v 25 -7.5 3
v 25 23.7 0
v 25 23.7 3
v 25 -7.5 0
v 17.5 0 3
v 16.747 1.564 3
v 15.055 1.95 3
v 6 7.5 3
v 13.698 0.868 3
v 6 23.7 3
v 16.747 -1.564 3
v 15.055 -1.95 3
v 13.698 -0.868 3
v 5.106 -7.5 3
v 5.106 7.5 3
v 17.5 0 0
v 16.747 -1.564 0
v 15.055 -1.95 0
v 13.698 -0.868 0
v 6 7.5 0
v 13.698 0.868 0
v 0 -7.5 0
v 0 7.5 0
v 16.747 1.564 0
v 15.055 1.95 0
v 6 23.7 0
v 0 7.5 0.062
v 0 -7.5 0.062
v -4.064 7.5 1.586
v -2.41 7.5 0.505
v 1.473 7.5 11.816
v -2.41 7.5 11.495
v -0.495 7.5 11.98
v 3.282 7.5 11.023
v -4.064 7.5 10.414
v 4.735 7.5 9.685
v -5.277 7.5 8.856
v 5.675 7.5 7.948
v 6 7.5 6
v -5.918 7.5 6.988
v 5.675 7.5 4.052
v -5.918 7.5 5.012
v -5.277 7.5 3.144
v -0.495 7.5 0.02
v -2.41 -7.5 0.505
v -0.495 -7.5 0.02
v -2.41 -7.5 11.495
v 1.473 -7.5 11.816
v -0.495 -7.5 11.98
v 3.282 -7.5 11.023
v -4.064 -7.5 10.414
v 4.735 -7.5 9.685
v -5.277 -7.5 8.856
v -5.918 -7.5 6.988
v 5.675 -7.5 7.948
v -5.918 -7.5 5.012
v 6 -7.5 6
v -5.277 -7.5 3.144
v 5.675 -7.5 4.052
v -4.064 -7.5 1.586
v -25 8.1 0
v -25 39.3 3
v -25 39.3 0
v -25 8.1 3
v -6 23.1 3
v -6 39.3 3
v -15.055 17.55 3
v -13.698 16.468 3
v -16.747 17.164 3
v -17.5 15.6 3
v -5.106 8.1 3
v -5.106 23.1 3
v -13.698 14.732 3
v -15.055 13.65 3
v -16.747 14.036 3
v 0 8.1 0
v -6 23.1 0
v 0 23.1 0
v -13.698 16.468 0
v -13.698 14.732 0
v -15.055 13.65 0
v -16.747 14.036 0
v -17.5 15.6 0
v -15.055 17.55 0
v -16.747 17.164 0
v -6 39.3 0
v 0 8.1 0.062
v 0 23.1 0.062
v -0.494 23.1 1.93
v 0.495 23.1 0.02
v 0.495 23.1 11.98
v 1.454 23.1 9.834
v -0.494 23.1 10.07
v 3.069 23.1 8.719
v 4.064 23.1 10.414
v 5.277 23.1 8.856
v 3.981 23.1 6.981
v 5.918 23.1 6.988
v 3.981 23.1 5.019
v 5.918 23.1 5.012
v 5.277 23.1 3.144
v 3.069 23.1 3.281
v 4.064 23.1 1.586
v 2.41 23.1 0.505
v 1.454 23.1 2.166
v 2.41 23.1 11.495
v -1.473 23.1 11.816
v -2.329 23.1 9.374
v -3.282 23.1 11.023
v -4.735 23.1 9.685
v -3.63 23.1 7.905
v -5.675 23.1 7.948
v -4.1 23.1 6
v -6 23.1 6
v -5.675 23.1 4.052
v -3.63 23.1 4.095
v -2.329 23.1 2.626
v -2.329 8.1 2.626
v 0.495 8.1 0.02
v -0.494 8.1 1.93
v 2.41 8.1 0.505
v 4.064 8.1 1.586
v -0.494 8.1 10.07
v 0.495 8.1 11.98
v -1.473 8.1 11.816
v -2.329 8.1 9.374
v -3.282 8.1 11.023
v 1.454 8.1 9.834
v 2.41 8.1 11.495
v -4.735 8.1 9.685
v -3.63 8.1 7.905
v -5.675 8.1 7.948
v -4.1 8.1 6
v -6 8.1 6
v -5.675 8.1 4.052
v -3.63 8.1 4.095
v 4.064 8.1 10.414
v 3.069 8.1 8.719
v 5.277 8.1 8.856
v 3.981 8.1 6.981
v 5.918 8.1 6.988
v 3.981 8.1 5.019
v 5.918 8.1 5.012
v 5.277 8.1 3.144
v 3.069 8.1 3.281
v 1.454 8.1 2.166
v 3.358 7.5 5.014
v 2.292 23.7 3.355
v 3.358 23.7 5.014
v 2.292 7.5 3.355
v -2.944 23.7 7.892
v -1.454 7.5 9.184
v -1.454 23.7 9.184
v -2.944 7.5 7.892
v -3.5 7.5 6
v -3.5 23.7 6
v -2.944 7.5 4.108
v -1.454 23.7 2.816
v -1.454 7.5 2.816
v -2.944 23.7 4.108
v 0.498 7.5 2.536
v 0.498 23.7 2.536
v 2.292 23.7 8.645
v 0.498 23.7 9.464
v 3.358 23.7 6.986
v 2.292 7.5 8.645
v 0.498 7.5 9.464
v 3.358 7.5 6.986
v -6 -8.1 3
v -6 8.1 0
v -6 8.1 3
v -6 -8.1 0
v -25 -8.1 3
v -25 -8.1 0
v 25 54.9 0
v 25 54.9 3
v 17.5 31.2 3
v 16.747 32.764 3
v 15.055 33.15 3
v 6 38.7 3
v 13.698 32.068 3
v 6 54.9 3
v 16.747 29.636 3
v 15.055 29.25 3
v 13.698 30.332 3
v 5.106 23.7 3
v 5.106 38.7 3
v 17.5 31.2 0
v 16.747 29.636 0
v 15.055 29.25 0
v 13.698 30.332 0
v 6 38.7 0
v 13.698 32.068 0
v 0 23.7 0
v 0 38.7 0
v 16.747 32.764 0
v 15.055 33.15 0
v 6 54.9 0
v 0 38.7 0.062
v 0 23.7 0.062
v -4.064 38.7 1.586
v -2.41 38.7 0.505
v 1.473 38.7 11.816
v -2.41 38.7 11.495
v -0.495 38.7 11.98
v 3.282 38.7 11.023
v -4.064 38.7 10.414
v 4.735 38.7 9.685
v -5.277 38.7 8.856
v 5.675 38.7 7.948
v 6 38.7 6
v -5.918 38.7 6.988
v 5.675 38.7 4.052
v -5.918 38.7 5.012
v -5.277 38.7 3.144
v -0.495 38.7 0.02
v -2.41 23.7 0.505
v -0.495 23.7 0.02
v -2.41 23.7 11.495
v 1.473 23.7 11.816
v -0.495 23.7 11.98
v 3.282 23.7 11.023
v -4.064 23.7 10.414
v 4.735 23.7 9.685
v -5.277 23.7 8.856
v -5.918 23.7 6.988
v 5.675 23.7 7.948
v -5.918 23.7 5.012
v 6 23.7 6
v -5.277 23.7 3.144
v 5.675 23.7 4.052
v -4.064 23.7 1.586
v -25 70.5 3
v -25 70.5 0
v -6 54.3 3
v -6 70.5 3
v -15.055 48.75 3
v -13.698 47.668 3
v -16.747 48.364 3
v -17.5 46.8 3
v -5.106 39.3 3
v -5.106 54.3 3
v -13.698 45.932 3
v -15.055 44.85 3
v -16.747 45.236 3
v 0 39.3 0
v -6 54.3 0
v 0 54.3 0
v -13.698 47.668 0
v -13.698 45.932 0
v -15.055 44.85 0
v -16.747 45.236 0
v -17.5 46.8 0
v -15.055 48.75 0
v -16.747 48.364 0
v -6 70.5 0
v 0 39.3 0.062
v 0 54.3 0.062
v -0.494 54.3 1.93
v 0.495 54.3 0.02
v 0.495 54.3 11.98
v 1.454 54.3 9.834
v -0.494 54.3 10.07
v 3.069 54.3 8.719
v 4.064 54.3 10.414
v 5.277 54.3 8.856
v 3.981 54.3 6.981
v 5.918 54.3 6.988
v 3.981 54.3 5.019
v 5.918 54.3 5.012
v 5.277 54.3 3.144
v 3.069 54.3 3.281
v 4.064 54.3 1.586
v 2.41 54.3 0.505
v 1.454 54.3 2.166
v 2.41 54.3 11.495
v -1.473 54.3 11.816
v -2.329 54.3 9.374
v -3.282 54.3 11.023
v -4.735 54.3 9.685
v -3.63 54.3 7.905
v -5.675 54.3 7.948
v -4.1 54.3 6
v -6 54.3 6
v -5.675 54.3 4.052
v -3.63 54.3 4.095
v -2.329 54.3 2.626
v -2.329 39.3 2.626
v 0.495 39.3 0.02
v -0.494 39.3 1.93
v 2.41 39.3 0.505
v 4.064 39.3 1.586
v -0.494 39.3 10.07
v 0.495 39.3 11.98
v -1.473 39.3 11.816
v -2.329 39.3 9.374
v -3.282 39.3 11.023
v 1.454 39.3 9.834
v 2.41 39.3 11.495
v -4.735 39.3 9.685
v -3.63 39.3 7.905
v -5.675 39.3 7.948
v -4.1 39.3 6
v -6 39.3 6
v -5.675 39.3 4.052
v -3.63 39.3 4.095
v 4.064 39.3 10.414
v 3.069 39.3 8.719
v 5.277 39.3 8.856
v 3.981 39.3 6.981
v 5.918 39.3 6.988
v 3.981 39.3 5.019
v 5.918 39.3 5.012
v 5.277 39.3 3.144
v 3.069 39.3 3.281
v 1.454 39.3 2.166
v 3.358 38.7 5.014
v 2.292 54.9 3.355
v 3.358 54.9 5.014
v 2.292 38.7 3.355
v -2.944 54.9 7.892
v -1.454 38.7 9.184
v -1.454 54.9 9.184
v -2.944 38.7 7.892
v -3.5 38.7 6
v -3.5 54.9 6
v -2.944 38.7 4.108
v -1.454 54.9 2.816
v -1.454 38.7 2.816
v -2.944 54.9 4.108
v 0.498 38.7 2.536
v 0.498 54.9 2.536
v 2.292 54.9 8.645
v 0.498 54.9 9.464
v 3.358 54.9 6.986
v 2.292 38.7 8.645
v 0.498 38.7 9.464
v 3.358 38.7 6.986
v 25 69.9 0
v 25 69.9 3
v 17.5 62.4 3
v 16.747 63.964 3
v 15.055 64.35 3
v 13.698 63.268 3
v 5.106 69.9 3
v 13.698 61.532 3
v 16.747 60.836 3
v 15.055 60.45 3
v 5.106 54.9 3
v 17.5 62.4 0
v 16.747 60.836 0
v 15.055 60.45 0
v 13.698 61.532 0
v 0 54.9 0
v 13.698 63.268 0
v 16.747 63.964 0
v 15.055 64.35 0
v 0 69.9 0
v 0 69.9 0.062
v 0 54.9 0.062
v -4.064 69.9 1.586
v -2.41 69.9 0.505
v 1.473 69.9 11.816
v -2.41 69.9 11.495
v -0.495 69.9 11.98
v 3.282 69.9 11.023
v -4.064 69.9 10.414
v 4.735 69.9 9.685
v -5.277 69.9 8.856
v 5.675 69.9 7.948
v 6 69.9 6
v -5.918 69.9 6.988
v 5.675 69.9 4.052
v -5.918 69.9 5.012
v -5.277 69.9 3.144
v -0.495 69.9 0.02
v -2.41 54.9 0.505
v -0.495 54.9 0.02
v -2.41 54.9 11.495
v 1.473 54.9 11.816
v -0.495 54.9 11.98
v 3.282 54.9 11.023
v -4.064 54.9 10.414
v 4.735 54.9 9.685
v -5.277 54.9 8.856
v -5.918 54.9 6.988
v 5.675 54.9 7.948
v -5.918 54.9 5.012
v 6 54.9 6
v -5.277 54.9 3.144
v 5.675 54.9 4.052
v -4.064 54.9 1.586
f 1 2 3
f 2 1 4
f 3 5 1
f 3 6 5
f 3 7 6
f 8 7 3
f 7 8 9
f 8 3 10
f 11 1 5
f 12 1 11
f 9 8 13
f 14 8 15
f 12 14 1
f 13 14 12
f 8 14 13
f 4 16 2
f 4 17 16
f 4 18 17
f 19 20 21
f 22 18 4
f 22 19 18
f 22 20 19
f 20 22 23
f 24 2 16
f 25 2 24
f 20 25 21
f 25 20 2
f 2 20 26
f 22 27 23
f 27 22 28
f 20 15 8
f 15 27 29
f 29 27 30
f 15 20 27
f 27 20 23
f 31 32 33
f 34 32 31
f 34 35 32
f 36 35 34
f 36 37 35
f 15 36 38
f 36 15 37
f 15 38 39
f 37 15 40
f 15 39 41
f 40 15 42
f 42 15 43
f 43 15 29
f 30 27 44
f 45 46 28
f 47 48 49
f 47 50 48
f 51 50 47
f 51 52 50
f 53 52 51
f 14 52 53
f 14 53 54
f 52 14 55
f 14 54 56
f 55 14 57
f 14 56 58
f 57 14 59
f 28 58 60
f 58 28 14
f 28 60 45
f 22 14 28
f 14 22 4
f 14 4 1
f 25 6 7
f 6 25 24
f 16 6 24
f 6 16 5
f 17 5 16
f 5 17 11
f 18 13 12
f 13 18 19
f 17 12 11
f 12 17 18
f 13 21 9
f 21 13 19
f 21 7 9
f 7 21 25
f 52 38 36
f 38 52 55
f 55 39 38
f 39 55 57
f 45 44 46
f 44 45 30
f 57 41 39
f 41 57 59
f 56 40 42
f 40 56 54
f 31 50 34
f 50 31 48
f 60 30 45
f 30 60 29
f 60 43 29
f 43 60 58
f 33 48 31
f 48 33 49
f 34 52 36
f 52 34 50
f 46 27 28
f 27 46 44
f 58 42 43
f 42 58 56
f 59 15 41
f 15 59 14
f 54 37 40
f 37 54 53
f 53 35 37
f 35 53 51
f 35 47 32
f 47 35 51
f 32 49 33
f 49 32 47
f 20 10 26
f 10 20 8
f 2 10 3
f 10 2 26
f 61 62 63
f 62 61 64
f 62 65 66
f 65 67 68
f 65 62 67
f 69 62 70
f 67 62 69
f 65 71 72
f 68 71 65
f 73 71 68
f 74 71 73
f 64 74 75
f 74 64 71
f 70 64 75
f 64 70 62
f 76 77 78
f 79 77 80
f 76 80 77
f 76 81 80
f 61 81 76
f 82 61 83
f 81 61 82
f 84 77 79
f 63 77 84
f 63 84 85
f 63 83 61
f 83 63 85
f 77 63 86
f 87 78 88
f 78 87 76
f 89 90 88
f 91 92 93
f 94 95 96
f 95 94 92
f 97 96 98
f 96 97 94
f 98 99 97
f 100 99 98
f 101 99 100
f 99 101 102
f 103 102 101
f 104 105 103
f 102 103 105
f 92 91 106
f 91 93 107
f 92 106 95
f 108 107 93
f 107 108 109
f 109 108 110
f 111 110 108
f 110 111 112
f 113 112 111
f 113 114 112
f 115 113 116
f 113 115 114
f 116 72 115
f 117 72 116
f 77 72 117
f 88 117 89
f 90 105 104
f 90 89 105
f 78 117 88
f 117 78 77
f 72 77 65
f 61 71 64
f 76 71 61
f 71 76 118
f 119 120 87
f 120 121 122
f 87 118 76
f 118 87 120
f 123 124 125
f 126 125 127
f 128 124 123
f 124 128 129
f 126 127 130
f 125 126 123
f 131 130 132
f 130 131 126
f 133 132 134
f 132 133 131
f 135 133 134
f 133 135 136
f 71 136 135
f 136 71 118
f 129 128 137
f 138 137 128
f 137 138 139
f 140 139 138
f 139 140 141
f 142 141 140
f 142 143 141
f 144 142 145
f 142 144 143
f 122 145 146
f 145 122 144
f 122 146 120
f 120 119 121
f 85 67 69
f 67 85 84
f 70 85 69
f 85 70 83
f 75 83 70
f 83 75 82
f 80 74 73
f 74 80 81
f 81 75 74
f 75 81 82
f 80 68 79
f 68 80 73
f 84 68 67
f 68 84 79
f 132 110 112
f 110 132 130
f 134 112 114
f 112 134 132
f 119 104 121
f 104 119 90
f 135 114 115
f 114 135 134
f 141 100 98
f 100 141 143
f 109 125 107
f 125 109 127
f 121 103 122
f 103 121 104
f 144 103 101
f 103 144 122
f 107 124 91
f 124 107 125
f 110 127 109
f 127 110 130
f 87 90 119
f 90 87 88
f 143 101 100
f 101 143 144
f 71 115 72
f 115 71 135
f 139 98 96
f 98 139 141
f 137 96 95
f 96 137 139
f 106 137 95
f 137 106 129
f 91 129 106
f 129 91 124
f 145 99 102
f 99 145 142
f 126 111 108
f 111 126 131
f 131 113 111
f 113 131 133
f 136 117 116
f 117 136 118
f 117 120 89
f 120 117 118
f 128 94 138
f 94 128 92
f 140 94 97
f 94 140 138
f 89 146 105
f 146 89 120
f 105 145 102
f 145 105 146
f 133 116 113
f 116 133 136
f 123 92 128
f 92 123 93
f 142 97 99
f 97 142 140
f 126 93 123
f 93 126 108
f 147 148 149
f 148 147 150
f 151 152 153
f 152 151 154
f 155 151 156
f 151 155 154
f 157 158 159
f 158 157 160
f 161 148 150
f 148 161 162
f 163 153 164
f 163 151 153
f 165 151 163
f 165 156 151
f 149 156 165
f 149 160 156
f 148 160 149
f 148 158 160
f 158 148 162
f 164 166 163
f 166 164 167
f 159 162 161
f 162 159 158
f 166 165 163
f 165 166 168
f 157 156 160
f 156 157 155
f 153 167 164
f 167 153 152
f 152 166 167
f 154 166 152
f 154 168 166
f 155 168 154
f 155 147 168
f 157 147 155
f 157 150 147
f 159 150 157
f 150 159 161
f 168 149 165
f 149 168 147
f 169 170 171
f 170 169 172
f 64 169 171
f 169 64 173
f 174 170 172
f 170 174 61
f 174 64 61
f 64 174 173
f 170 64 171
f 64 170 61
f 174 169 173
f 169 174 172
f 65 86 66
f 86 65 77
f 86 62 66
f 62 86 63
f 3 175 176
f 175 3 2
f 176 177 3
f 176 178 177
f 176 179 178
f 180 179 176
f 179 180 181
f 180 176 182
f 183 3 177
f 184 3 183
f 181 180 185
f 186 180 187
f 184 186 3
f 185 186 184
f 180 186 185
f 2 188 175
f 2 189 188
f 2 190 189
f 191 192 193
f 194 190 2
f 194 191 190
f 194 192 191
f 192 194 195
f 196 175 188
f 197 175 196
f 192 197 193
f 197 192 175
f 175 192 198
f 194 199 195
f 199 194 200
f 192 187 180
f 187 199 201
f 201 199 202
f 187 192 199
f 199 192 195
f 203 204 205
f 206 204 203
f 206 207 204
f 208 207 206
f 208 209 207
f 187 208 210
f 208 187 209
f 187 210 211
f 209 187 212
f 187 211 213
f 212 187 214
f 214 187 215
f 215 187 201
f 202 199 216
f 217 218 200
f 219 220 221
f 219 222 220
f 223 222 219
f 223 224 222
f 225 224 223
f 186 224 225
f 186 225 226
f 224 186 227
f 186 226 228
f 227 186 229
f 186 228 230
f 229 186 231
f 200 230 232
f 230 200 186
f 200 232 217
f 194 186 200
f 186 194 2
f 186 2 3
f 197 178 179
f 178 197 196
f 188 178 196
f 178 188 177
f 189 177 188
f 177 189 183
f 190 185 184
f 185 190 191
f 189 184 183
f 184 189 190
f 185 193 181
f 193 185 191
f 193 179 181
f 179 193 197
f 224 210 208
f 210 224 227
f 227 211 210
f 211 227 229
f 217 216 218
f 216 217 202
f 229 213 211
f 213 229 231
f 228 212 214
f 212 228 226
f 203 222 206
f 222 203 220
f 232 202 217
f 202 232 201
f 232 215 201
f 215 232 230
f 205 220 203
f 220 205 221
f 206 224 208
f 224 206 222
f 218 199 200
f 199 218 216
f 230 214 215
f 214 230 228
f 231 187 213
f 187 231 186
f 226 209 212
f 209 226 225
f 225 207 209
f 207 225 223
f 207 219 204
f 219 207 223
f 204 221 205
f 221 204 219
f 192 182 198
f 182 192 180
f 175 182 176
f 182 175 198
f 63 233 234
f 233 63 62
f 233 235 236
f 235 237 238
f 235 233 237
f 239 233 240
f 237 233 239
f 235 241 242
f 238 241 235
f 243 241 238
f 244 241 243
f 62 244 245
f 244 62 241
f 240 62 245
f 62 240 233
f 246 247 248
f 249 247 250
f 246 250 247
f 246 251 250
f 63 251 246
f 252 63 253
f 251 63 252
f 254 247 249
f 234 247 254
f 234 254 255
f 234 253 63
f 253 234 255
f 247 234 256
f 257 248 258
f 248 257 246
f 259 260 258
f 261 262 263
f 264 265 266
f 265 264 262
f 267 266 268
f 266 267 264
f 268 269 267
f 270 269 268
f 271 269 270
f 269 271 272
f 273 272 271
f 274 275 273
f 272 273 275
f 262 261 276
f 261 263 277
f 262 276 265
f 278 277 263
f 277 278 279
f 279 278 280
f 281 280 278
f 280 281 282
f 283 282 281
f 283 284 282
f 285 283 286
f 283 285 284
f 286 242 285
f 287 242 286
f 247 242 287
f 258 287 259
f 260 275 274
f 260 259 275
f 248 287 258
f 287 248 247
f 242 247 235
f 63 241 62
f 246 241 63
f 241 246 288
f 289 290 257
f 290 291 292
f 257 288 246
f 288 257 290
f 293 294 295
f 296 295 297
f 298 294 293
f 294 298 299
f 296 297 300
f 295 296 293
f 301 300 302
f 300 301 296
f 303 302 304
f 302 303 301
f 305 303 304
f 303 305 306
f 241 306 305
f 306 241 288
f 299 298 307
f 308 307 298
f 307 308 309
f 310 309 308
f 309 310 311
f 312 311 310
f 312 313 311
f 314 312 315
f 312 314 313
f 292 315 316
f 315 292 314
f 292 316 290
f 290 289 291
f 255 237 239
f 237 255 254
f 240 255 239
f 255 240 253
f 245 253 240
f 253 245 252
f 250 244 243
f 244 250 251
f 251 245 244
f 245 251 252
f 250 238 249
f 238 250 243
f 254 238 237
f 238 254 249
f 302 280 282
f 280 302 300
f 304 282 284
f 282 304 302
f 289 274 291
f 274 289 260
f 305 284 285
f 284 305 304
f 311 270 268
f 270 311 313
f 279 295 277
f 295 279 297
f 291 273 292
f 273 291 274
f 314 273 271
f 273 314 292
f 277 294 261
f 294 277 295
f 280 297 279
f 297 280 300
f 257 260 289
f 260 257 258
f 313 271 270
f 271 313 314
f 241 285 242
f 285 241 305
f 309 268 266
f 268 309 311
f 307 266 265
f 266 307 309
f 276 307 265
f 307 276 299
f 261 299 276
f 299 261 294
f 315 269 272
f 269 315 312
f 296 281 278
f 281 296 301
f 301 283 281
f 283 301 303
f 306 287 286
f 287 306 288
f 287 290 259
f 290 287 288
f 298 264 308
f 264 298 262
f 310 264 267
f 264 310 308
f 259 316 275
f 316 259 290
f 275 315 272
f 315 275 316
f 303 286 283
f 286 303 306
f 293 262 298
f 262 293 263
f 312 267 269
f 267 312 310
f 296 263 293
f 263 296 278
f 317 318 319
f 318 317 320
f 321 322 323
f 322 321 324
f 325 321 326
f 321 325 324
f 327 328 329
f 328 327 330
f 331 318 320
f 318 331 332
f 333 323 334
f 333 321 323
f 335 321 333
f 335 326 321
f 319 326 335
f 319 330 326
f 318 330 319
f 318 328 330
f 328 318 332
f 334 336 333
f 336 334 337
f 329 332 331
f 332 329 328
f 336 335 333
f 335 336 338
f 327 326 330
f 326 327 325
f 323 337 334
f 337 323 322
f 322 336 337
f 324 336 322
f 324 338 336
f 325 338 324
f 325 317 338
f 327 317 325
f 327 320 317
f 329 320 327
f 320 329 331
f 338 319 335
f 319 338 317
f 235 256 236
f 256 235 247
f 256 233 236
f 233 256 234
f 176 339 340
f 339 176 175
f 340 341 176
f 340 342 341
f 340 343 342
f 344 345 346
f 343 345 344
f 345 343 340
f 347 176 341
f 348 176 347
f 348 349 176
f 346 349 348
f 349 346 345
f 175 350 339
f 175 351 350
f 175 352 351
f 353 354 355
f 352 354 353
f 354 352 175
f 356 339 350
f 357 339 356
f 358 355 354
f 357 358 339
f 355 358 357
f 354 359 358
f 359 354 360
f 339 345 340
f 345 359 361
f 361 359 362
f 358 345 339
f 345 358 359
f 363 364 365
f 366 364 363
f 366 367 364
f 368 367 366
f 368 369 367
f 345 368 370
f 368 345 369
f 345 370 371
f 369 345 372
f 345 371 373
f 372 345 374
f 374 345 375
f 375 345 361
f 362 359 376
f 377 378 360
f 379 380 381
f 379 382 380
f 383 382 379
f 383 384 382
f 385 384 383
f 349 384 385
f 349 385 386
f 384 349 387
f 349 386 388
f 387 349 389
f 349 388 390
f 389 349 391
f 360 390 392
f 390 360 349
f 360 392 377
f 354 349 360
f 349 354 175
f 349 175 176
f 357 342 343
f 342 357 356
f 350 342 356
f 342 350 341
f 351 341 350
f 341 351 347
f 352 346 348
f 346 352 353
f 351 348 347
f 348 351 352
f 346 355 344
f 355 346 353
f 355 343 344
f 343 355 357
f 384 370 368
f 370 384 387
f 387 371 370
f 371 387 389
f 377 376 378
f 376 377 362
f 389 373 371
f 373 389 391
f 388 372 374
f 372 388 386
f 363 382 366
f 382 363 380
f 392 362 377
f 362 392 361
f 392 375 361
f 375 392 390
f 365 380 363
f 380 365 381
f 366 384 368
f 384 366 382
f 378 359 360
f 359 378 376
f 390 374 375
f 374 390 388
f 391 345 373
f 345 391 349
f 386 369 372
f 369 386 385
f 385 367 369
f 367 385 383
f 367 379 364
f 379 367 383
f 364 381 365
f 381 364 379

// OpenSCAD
/*[Link]*/
LinkRadius = 6;
//This is the length of each link, consider that this is the distance that your printer needs to be able to bridge.
LinkLength = 15;
//The thicker, the sturdier the overall hinge. Obiously InnerShaft + Inner Tolerance should never be bigger than Link Radius.
InnerShaft = 3.5;
//Depends on your printer/material, .6 worked well for me (this is the distance between the inner shaft and the inner layers of the links)
InnerTolerance = .6;
//Spacing between the links, i found .6mm to give good results
Spacing = .6;
//LinkNumber * LinkLength = the total length of your hinge.
LinkNumber = 5;
/*[Tabs]*/
TabLength0 = 25;
TabLength = 25;
TabThickness = 3;
HoleDiameter=4;
HoleOffset0=0;
HoleOffset=0;
//Do you want 2 long tabs or multiple smaller ones? 0=Yes, 1=No
LongTab = 0;

TotalLength = (LinkNumber*LinkLength)+(Spacing*(LinkNumber-1));


module solidHinge(LinkRadius,LinkLength,TabLength,TabThickness){
    union(){
        rotate([90,0,0]) linear_extrude(height=LinkLength,center=true) translate([0,LinkRadius,0]) circle(LinkRadius);
        translate([TabLength/2,0,TabThickness/2]) 
        difference(){cube([TabLength,LinkLength,TabThickness],center=true);
            translate([LinkRadius/2+HoleOffset,0,0])cylinder(h=TabThickness,r=HoleDiameter/2,center=true);
        }
    }
}


module hollowHinge(LinkRadius,LinkLength,TabLength,TabThickness,Spacing,InnerTolerance,InnerShaft){
    union(){
        difference(){
            union(){
                rotate([90,0,0]) linear_extrude(height=LinkLength,center=true) translate([0,LinkRadius,0]) circle(LinkRadius);
                translate([TabLength0/2,0,TabThickness/2]) 
                difference(){cube([TabLength0,LinkLength,TabThickness],center=true);
                translate([LinkRadius/2+HoleOffset0,0,0])cylinder(h=TabThickness,r=HoleDiameter/2,center=true);
                }
            }
            rotate([90,0,0]) linear_extrude(height=LinkLength+Spacing,center=true) translate([0,LinkRadius,0]) circle(InnerShaft+InnerTolerance,center=true);
        }
        rotate([90,0,0]) linear_extrude(height=LinkLength+(Spacing*2),center=true) translate([0,LinkRadius,0]) circle(InnerShaft,center=true);
    }
}

module CompleteHinge(LinkRadius,LinkLength,TabLength,TabThickness,Spacing,InnerTolerance,InnerShaft,LongTab,LinkNumber){
    
    union(){
        for(a=[0:LinkNumber-1]){
            if(a%2!=0){
                union(){
                mirror(1,0,0) translate([0,(LinkLength+(Spacing))*a,0]) hollowHinge(LinkRadius,LinkLength,TabLength,TabThickness,Spacing,InnerTolerance,InnerShaft); 
                   if(LongTab==0 && a!=LinkNumber-1){
                       if(a==1){
                       translate([-TabLength0/2-LinkRadius/2,0,TabThickness/2]) cube([TabLength0-LinkRadius,LinkLength+(Spacing*2),TabThickness],center=true);
                       }
                    translate([-TabLength0/2-LinkRadius/2,(LinkLength+(Spacing))*(a+1),TabThickness/2]) cube([TabLength0-LinkRadius,LinkLength+(Spacing*2),TabThickness],center=true); }
                } 
            }
            else{
                union(){
                translate([0,(LinkLength+(Spacing))*a,0]) solidHinge(LinkRadius,LinkLength,TabLength,TabThickness);
                    if(LongTab==0 && a!=LinkNumber-1){
                    translate([TabLength/2+LinkRadius/2,(LinkLength+(Spacing))*(a+1),TabThickness/2]) cube([TabLength-LinkRadius,LinkLength+(Spacing*2),TabThickness],center=true); }
                }             
            }
            if(LinkNumber%2==0){
                if(a==LinkNumber-1){
                    translate([0,((LinkLength+(Spacing))*a)+(LinkLength/2)+Spacing+(LinkLength/20),0]) rotate([90,0,0]) linear_extrude(height=LinkLength/10,center=true) translate([0,LinkRadius,0]) circle(LinkRadius); 
                }
            }
        }
        /*if(LongTab==0){
            color("blue",1) translate([(TabLength+LinkRadius)/2,(TotalLength/2)-(LinkLength/2)]) linear_extrude(height=TabThickness)square([(TabLength-LinkRadius),TotalLength],center=true);                
            color("blue",1) color("blue",1) translate([-(TabLength0+LinkRadius)/2,(TotalLength/2)-(LinkLength/2)]) linear_extrude(height=TabThickness)square([(TabLength0-LinkRadius),TotalLength],center=true);
        }*/
    }
    
}

CompleteHinge(LinkRadius,LinkLength,TabLength,TabThickness,Spacing,InnerTolerance,InnerShaft,LongTab,LinkNumber);
//hollowHinge(LinkRadius,LinkLength,TabLength,TabThickness,Spacing,InnerTolerance,InnerShaft);
